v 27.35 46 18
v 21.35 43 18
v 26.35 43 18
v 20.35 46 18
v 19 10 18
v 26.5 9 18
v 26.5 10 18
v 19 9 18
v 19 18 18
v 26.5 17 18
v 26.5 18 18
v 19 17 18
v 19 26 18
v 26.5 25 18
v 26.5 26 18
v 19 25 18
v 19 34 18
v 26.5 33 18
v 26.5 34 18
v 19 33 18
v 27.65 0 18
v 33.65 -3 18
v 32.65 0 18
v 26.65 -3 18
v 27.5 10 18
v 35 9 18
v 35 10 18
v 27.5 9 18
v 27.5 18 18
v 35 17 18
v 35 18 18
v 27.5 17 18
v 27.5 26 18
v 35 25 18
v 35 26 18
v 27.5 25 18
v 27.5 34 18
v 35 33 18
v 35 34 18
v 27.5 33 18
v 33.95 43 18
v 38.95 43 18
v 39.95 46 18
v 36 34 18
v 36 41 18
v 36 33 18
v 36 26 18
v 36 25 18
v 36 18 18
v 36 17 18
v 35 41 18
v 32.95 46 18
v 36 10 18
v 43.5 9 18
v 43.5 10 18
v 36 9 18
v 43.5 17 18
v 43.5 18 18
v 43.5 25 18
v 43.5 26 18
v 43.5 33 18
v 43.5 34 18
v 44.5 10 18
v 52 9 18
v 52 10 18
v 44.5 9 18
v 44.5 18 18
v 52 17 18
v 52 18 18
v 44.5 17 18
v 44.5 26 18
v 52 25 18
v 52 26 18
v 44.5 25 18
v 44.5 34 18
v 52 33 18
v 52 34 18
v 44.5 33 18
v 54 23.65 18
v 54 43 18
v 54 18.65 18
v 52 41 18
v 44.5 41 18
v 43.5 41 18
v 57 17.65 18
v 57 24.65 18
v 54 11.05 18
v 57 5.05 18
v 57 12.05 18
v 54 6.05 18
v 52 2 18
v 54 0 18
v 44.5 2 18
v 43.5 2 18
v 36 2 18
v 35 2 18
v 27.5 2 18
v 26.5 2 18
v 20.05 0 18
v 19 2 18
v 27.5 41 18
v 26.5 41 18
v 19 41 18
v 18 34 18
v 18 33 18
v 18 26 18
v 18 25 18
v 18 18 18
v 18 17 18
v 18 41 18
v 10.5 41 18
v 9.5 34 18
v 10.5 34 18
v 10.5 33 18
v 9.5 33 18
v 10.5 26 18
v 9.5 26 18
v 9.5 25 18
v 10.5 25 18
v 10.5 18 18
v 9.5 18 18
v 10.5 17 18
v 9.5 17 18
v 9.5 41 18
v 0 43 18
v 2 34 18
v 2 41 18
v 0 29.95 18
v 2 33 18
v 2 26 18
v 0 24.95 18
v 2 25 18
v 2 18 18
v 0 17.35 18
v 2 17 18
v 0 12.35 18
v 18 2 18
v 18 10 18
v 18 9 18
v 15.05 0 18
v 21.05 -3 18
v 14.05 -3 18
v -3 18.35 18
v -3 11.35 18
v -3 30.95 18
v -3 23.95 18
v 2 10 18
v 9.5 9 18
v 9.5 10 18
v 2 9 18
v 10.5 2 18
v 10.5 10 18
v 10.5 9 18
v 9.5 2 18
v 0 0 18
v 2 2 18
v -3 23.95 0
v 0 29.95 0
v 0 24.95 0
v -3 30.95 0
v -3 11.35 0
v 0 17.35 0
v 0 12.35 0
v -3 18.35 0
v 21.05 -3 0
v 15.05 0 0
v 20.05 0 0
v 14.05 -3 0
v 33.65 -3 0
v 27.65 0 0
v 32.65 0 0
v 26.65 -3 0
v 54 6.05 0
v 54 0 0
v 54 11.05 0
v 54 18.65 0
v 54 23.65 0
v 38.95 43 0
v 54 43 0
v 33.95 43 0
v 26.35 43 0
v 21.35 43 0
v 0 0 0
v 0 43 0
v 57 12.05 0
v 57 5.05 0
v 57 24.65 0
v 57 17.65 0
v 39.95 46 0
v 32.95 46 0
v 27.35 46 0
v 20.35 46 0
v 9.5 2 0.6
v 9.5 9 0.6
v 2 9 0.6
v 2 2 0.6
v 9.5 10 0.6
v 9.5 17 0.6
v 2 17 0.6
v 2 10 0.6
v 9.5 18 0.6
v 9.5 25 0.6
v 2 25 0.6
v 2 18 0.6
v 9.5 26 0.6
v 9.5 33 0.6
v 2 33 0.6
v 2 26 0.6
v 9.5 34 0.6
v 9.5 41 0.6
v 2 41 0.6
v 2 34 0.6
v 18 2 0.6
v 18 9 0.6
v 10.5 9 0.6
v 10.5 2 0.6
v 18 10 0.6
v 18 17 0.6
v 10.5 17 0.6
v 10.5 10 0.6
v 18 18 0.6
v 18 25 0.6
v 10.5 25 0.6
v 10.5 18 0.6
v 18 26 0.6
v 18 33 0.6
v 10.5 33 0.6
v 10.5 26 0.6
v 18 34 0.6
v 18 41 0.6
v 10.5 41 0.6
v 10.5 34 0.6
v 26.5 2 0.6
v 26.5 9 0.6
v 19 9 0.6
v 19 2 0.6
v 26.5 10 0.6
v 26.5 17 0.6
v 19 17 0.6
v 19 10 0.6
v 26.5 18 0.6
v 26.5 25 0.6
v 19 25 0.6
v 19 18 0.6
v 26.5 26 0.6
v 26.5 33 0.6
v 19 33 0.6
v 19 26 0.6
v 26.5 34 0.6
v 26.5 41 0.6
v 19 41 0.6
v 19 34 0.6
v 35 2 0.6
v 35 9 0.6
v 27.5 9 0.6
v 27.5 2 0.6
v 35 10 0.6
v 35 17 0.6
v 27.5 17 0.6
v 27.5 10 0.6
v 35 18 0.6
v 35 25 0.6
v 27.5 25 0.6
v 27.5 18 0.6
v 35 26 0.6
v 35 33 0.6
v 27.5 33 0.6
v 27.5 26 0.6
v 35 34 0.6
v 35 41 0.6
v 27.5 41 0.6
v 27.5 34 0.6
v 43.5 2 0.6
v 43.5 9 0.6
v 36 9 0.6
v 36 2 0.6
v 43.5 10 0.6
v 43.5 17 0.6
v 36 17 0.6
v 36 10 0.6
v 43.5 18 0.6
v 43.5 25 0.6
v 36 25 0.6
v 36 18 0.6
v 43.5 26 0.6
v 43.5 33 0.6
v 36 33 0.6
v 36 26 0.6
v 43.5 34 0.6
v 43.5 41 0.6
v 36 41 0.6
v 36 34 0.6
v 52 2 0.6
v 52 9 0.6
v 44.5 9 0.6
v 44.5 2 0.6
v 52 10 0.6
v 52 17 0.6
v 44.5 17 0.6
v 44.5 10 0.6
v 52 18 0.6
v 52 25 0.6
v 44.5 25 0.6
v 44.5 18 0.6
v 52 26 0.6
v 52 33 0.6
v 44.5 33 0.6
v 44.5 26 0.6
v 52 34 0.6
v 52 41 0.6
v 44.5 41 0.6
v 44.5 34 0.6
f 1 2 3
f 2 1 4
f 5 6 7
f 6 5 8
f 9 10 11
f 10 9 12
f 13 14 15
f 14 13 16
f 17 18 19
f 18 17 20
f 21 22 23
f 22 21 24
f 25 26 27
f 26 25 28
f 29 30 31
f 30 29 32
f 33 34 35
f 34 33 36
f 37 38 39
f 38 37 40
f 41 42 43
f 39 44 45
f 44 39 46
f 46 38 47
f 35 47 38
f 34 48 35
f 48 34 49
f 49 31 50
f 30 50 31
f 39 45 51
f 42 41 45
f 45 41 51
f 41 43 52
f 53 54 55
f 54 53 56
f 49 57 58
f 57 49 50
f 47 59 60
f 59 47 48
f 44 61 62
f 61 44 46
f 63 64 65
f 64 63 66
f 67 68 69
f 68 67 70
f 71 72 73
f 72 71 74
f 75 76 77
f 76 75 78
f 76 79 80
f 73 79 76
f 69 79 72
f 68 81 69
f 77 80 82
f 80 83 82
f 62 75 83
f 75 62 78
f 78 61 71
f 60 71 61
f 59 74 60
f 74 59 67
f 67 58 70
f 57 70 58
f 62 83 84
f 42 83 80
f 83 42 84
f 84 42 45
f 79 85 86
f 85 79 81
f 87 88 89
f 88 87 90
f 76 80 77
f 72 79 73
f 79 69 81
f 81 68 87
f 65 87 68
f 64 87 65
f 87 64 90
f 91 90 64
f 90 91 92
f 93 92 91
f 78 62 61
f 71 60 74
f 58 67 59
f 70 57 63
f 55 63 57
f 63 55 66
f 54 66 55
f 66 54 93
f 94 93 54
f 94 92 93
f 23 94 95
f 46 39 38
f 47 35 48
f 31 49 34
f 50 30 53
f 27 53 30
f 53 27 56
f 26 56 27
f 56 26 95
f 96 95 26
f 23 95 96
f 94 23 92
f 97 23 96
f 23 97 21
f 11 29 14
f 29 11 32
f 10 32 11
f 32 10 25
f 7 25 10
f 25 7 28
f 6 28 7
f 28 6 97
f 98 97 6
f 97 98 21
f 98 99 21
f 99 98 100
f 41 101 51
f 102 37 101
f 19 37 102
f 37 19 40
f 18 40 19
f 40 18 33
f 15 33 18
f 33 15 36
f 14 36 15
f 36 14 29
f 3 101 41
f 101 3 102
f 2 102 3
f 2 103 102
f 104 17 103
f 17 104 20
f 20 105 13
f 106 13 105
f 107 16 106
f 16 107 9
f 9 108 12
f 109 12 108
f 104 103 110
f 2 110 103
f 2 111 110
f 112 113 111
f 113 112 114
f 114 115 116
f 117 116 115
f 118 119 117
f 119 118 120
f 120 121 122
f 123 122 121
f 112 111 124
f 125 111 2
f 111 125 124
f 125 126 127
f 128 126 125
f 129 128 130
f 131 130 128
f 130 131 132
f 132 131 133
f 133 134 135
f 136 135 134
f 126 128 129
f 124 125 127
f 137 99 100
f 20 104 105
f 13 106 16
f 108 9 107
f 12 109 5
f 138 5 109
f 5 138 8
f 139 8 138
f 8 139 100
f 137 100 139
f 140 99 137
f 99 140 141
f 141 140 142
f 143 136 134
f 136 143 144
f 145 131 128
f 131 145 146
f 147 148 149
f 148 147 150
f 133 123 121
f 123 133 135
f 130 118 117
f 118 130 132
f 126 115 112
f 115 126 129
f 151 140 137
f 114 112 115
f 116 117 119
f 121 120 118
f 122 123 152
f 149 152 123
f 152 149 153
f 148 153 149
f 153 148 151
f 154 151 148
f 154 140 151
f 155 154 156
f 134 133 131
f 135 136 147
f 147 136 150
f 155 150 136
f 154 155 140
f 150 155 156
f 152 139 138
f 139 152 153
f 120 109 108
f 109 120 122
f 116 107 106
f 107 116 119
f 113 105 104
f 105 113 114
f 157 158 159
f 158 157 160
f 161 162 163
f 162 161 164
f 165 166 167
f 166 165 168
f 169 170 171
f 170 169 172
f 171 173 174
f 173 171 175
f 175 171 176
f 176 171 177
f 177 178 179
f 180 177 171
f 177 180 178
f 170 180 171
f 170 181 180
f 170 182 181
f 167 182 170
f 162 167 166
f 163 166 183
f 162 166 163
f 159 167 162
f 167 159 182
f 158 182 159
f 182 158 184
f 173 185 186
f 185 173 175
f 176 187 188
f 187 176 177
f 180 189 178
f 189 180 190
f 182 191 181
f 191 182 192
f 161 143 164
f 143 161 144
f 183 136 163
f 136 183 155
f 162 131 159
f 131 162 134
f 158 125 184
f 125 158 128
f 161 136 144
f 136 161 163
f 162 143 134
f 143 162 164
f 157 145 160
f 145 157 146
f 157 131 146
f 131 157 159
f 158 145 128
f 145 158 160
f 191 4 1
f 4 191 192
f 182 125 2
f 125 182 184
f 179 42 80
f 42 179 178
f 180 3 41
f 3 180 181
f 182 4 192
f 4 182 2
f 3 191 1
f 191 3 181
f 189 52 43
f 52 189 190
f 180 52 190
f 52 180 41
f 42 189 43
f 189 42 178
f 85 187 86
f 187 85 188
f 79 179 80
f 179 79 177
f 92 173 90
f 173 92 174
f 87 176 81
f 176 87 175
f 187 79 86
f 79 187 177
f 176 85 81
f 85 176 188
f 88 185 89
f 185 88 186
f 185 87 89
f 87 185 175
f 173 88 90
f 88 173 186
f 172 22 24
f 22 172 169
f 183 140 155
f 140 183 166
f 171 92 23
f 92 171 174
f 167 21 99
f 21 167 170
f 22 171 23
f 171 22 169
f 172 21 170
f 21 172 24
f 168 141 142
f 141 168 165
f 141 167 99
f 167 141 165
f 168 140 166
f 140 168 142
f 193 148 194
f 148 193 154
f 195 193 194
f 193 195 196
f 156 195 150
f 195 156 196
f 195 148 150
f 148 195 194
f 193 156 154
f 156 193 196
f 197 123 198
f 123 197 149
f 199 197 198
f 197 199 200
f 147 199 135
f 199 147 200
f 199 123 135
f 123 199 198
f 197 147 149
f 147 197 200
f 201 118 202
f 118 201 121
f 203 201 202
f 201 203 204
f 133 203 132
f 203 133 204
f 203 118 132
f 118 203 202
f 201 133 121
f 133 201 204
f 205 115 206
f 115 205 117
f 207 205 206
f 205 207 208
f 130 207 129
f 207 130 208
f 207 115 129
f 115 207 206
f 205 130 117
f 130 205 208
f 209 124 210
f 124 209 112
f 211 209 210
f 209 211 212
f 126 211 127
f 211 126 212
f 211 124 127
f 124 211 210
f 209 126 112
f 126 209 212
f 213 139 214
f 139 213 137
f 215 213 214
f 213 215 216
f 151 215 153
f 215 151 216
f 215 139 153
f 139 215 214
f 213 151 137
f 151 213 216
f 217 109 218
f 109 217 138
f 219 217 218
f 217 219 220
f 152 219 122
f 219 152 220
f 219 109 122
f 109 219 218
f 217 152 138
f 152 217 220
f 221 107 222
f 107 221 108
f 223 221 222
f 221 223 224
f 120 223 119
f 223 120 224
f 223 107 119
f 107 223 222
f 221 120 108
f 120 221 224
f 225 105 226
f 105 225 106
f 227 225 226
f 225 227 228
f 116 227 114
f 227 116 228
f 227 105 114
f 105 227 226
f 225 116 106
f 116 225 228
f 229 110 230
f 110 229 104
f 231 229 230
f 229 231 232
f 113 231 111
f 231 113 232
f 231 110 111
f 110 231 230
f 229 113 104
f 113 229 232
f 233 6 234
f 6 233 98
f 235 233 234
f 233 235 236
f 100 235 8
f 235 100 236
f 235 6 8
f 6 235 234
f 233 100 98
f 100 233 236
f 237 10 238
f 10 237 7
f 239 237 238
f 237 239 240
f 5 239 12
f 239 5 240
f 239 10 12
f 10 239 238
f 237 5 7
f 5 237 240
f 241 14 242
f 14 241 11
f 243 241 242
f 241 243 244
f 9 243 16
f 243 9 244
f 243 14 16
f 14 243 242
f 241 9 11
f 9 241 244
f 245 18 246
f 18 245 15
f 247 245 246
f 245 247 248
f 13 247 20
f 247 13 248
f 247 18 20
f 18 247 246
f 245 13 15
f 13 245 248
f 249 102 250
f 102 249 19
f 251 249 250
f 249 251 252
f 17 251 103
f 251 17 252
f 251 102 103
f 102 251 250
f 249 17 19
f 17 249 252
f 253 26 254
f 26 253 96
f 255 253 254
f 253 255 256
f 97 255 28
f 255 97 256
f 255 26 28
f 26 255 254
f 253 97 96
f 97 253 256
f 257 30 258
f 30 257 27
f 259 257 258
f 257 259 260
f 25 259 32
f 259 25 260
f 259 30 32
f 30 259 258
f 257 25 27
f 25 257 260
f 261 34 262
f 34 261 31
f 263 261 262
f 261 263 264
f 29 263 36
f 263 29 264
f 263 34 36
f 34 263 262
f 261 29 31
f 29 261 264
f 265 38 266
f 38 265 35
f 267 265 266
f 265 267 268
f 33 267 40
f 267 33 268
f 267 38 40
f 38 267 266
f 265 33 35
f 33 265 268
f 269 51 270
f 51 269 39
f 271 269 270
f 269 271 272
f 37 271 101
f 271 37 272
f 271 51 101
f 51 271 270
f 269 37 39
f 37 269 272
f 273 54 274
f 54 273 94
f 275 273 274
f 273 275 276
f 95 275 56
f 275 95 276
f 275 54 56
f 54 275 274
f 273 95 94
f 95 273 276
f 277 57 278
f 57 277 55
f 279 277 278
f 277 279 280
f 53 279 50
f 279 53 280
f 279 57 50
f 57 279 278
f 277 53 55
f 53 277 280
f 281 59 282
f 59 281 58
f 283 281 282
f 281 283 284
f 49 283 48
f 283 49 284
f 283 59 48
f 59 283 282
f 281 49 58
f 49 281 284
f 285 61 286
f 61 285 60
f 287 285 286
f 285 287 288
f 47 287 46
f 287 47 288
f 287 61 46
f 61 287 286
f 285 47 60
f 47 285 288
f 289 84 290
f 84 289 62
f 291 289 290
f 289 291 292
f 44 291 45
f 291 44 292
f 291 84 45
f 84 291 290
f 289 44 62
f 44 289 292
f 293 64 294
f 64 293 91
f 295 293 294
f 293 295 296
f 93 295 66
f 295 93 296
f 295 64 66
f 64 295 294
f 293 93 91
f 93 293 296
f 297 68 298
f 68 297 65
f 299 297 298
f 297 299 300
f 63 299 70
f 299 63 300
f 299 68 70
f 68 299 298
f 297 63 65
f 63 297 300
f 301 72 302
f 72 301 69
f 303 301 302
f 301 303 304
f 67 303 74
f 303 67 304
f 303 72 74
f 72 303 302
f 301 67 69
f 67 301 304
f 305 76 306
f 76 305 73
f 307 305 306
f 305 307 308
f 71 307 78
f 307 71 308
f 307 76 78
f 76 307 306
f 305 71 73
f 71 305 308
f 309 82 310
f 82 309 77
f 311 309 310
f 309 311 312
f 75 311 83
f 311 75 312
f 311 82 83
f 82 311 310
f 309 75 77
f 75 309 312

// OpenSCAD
//Base Clip holder for Wasabi Wars
//  by Mark Tabije

//Creating Modular pieces that join via dove tail.


//Notes:  Simple base 30mm is 38mm width, 5.5 height, symbol clip is 5.88 height.

/* [Basic] */

boxDepth = 18;      //Depth of Storage device in mm
boxBottomThickness = .6;

rowsOfLevelClips = 5;
colsOfLevelClips = 2;
rowsOfSymbolClips = 5;
colsOfSymbolClips = 6;
//rowsOfSymbolClips = 3;
//colsOfSymbolClips = 3;


includeLevelClip = true;   //Include slots for Level Clips 
levelClipHeight = 6;     //Height of Level Clip slots
levelClipWidth = 44;        //Width of Level Clip slots  (44m for 30mmSmallBase_V2a; 33mm for 20mmSmallBase_V2a)

includeSymbolClip = true;   //Include slots for Symbol Clips 
symbolClipHeight = 7;     //Height of Symbol Clip slots
symbolClipWidth = 7.5;        //Width of Symbol Clip slots

includeBase = false;    //Include slots for bases
baseHeight = 0;         //Height of Base slots
baseWidth = 0;          //Width of Base slots


/* [Advanced] */
innerWallThickness = 1;
outerWallThickness = 2;

connectorLongSide = 7;  //Male Connector
connectorShortSide = 5; //Male Connector
connectorDepth = 3;     //Male Connector
connectorFemaleSupportSide = 10; 
connectorTolerance = .3;

//********** Set Box Width ************
//*** Uncomment for Manual Version of Box Width and height 
//boxWidth = 140;
//boxHeight = 46.5;

//*** Uncomment for Automated Version of Box Width and height - You must manually change the formula based on the cuttout you are using
//Level Clips
    //boxWidth = outerWallThickness*2 + (levelClipWidth+innerWallThickness)*colsOfLevelClips-innerWallThickness;
    //boxHeight = outerWallThickness*2 + (levelClipHeight+innerWallThickness)*rowsOfLevelClips-innerWallThickness;
//Symbol Clips
    boxWidth = outerWallThickness*2 + (symbolClipWidth+innerWallThickness)*colsOfSymbolClips-innerWallThickness;
    boxHeight = outerWallThickness*2 + (symbolClipHeight+innerWallThickness)*rowsOfSymbolClips-innerWallThickness;

//********** Set Connector Position ************
//*** Uncomment for Manual Version of Connector Position
//connectorOffsetX = 45;
connectorOffsetY = 18; //(18mm for SmallBaseV2 5 rows;)

//*** Uncomment for Automated Version of Connector Position which is 1/2 way.
connectorOffsetX = boxWidth/2;
//connectorOffsetY = boxHeight/2;

echo("connectorOffsetX: ",connectorOffsetX);
echo("connectorOffsetY: ",connectorOffsetY);

/* [Hidden] */



//**** Main

//Calculating where to start the Symbol Clips (after level Clips)
startSymbolClipsX = outerWallThickness + colsOfLevelClips*(innerWallThickness+levelClipWidth);


difference()
{
    //Main Block and Connector
    union()
    {
     
        //Main Block - BUG/DEV need to parametrticise this
        cube([boxWidth, boxHeight, boxDepth]);
        
        //Quad Connectors starting at the left side and going clockwise
        //Quad Connector 1 
        translate([0,connectorOffsetY,0])
            rotate([0,0,90])
                quadConnector(connectorDepth, connectorLongSide, connectorShortSide, boxDepth, 10, connectorTolerance, false);
        
        //Quad Connector 2
            translate([connectorOffsetX,boxHeight,0])
                rotate([0,0,0])
                    quadConnector(connectorDepth, connectorLongSide, connectorShortSide, boxDepth, 10, connectorTolerance, false);
      
        //Quad Connector 3 
        translate([boxWidth,connectorOffsetY,0])
            rotate([0,0,-90])
                quadConnector(connectorDepth, connectorLongSide, connectorShortSide, boxDepth, 10, connectorTolerance, false);
        
        //Quad Connector 4
            translate([connectorOffsetX,0,0])
                rotate([0,0,180])
                    quadConnector(connectorDepth, connectorLongSide, connectorShortSide, boxDepth, 10, connectorTolerance, false);
        
        
        /*  Old connector idea
            //Male Connector 1
            translate([0,boxHeight/2,0])
                rotate([0,0,90])
                    maleConnector(connectorDepth, connectorLongSide, connectorShortSide, boxDepth);
            
            //Male Connector 2
            translate([boxWidth/2,0,0])
                rotate([0,0,180])
                    maleConnector(connectorDepth, connectorLongSide, connectorShortSide, boxDepth);
            
            //Instead of female connector and male connectors code using quad connectors 2 male connectors 
            //  on both sides.
            
            //Female Connector 2
            translate([boxWidth/2,0,0])
                rotate([0,0,180])
                    femaleConnector(connectorDepth, connectorLongSide, connectorShortSide, boxDepth, 10, connectorTolerance, false);
        */
     }
    
    //**********  Set pieces to Cutt **************
    //Cut Level Clips
    //createCutOuts(levelClipWidth, levelClipHeight, boxDepth, rowsOfLevelClips, colsOfLevelClips, outerWallThickness, innerWallThickness, boxBottomThickness, 0, 0);

    //Cut Abiliy Clips
    //createCutOuts(symbolClipWidth, symbolClipHeight, boxDepth, rowsOfSymbolClips, colsOfSymbolClips, outerWallThickness, innerWallThickness, boxBottomThickness, startSymbolClipsX, 0);
    createCutOuts(symbolClipWidth, symbolClipHeight, boxDepth, rowsOfSymbolClips, colsOfSymbolClips, outerWallThickness, innerWallThickness, boxBottomThickness, 0, 0);

}


//**** Support Modules
module createCutOuts(cutWidth, cutHeight, cutDepth, numRows, numCols, outerSpacing, innerSpacing, bottomSpacing, initialX, initialY)
{
    rowIncrement = cutHeight + innerSpacing;
    colIncrement = cutWidth + innerSpacing;
    rowMax = initialY + rowIncrement * numRows;
    colMax = initialX + colIncrement * numCols;
   
    for (a=[outerSpacing+initialX:colIncrement:colMax])    
    {
        for (b=[outerSpacing+initialY:rowIncrement:rowMax])
        {   
            translate([a, b, bottomSpacing])
                cube([cutWidth, cutHeight, cutDepth]);    
        }
    }    
    
    
}

module prism(l, w, h)
{
       polyhedron(
               points=[[0,0,0], [l,0,0], [l,w,0], [0,w,0], [0,w,h], [l,w,h]],
               faces=[[0,1,2,3],[5,4,3,2],[0,4,5,1],[0,3,4],[5,2,1]]
               );
}

module maleConnector(cDepth, cLongWidth, cShortWidth, cHeight)
{
        //Converting values to work with prism
        cw = cDepth;
        ch = cShortWidth;
        cl = cHeight;
  
        pw = cDepth;
        //ph = cLongWidth/2;
        ph = (cLongWidth - cShortWidth)/2;
        pl = cHeight;
    
        rotate([0,-90,0])
        {
            union()
            {
                    
                translate([0,0,-cShortWidth/2])
                    cube([cl,cw,ch]);
                
                translate([0,0,cShortWidth/2])
                    prism(pl,pw,ph);
                
                mirror([0,0,1])
                    translate([0,0,cShortWidth/2])
                        prism(pl,pw,ph);//prism(pl,pw,ph);
            }
        } 
}


module femaleConnector(cDepth, cLongWidth, cShortWidth, cHeight, cSupport, cTolerance, supportOnly)
{
        //BUG/DEV cSupport not coded yet.  This is supposed to make the female part wider for more support. 
    
        //Converting values to work with prism
        cw = cDepth;
        ch = cShortWidth;
        cl = cHeight;
  
        pw = cDepth;
        ph = (cLongWidth - cShortWidth)/2;
        pl = cHeight;
    
        translate([-(cShortWidth+(cLongWidth-cShortWidth)/2+cTolerance),cDepth,1])
            rotate([0,-90,180])
            {
                union()
                {
                        
                    translate([0,0,-cShortWidth/2])
                        cube([cl,cw,ch]);
                    
                    translate([0,0,cShortWidth/2])
                        prism(pl,pw,ph);
                    
                    mirror([0,0,1])
                        translate([0,0,cShortWidth/2])
                            prism(pl,pw,ph);//prism(pl,pw,ph);
                }
            } 
         
         translate([-(cShortWidth+(cLongWidth-cShortWidth)/2+cTolerance),cDepth,1])
            rotate([0,-90,180])
            {
                union()
                {
                        
                    translate([0,0,-cShortWidth/2])
                        cube([cl,cw,ch]);
                    
                    translate([0,0,cShortWidth/2])
                        prism(pl,pw,ph);
                    
                    mirror([0,0,1])
                        translate([0,0,cShortWidth/2])
                            prism(pl,pw,ph);//prism(pl,pw,ph);
                }
            }
}

module quadConnector(cDepth, cLongWidth, cShortWidth, cHeight, cSupport, cTolerance, supportOnly)
{
    //This creates 2 dove tails that will fit a mirror image of them.  They are shifted
    //to the right.
    
    midpointOfDiagonal = (cLongWidth - cShortWidth)/4;
    initialShiftX = cShortWidth/2 + midpointOfDiagonal+cTolerance/2;
    wholeShiftX = cShortWidth+(cLongWidth-cShortWidth)/2+cTolerance;
    
    translate([-initialShiftX,0,0])
        maleConnector(connectorDepth, connectorLongSide, connectorShortSide, boxDepth);
    
    translate([-initialShiftX+wholeShiftX*2,0,0])
        maleConnector(connectorDepth, connectorLongSide, connectorShortSide, boxDepth);
    

    //Uncomment Below for testing purposes
    /*
        translate([initialShiftX,cDepth,0])
            rotate([0,0,180])
                maleConnector(connectorDepth, connectorLongSide, connectorShortSide, boxDepth);
      
        translate([initialShiftX-wholeShiftX*2,cDepth,0])
            rotate([0,0,180])
                maleConnector(connectorDepth, connectorLongSide, connectorShortSide, boxDepth);
    */
}

    
